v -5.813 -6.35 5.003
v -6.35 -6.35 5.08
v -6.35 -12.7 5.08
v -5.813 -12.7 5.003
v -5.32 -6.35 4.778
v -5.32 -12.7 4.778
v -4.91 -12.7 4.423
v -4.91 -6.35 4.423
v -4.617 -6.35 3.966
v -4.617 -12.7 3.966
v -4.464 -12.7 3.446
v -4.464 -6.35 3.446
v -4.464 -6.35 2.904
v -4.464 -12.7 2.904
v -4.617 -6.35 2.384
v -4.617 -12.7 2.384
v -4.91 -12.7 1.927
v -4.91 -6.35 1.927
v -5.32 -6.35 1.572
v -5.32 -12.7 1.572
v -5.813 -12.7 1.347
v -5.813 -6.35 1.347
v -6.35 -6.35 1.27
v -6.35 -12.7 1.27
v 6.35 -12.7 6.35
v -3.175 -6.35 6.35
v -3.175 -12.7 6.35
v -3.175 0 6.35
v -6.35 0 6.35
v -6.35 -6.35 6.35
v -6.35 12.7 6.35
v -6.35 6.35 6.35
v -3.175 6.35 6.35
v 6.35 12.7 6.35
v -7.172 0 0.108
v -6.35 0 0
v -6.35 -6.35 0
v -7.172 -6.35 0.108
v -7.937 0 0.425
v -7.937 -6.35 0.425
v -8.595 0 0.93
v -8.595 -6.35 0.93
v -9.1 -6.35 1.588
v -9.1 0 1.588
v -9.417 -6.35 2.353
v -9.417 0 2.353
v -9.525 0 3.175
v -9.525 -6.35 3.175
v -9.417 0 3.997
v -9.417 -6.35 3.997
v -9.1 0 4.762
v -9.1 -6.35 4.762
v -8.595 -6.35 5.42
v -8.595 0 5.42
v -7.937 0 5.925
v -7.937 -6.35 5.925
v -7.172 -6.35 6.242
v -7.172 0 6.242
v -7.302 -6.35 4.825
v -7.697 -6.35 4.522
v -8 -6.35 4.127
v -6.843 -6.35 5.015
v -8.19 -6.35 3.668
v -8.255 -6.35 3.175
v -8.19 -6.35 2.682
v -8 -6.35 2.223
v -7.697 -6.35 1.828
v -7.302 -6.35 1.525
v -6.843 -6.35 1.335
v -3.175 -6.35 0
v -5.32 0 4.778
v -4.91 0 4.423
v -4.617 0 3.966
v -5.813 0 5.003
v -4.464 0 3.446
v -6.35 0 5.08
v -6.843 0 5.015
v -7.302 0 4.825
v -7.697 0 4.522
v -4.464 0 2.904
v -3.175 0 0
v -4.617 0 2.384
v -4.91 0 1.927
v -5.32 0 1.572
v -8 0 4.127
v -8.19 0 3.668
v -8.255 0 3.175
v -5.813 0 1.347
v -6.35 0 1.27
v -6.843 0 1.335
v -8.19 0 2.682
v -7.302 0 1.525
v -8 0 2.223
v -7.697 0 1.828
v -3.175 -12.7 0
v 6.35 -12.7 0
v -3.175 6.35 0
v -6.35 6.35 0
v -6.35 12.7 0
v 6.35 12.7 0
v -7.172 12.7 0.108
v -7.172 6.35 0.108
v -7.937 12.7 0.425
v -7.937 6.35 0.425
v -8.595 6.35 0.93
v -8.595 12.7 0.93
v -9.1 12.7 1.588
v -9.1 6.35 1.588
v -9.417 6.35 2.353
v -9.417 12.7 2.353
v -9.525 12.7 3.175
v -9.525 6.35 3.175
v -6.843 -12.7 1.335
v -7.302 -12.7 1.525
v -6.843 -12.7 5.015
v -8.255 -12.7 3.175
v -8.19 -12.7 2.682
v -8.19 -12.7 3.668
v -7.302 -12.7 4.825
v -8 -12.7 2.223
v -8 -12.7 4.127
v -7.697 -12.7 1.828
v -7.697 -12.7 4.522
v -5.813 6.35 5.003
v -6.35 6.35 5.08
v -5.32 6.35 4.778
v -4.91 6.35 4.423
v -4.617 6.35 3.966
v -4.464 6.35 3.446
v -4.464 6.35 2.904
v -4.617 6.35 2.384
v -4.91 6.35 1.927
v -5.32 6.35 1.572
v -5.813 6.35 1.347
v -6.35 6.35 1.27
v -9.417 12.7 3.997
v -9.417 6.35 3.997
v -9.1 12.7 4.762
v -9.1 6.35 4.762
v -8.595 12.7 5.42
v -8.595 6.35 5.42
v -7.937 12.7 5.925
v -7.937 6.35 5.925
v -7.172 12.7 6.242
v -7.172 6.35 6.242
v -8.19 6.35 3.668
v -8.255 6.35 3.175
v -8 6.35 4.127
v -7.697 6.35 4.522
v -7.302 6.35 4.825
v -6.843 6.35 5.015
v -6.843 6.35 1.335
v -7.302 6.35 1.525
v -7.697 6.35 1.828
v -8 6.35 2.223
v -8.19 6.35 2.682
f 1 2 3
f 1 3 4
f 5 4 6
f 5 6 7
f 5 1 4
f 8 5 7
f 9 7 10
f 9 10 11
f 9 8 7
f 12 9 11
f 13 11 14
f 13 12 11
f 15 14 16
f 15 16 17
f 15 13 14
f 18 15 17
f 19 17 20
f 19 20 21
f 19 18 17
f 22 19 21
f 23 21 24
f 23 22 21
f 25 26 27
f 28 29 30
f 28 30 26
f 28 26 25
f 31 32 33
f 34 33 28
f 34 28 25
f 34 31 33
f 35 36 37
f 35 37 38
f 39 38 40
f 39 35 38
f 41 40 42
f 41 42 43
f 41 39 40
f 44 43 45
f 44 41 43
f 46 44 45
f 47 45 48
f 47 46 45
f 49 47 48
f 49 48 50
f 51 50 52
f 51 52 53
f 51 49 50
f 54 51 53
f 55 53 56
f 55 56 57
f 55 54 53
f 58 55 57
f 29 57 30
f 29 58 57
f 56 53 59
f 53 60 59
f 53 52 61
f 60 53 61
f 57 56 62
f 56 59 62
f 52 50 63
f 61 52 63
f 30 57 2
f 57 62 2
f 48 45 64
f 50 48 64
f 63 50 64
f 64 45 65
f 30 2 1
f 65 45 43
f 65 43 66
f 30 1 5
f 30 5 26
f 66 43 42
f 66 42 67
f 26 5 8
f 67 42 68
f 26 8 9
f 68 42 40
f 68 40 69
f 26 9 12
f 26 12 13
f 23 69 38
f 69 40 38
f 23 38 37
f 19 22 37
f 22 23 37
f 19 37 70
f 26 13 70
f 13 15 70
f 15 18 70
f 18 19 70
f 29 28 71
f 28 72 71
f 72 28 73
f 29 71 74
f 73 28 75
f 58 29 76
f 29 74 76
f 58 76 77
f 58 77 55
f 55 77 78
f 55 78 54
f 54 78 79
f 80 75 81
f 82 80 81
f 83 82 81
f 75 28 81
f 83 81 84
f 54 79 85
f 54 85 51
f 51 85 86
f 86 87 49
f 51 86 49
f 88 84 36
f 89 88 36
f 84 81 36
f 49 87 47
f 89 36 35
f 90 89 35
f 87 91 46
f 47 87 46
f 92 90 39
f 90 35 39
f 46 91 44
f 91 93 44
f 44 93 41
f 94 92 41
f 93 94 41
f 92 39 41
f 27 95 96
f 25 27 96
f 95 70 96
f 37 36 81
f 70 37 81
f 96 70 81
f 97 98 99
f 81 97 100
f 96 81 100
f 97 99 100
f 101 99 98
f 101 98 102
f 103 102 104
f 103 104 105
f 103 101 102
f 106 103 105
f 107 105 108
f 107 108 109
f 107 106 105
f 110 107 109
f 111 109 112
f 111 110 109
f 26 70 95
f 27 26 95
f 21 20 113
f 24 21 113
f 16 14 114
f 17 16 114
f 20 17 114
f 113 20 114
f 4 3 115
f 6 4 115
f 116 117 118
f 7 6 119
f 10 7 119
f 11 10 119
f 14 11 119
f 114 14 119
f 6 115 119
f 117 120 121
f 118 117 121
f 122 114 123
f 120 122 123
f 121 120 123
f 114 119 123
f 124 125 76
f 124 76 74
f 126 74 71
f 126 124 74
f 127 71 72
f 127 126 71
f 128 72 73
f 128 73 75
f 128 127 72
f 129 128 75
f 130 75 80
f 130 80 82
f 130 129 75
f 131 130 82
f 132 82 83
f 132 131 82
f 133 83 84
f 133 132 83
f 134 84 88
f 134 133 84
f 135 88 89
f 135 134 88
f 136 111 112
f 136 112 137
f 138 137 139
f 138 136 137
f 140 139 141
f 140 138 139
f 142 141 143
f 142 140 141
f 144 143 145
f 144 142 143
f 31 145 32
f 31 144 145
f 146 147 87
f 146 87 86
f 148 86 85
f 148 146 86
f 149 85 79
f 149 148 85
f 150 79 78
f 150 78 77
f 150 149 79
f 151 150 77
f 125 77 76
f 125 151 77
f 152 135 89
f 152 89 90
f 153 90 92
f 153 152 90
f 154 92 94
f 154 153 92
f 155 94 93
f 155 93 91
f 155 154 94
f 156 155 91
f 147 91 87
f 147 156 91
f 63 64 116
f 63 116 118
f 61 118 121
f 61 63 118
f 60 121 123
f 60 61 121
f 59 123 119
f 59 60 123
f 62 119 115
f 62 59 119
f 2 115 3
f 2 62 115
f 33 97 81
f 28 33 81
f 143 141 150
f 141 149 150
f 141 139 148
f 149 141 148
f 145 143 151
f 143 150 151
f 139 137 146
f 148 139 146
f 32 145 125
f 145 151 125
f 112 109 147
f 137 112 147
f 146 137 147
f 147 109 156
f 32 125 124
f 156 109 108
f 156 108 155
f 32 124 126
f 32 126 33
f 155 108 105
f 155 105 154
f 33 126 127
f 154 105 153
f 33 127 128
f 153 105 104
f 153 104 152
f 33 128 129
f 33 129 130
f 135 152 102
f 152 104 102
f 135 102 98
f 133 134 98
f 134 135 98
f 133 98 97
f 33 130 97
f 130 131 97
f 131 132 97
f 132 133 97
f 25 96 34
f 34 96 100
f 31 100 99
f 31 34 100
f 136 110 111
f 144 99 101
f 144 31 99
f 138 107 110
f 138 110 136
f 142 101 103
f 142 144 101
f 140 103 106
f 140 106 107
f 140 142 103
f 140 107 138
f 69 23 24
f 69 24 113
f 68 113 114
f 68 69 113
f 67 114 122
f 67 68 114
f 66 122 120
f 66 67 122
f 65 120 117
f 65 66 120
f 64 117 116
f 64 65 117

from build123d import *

# Parameters (mm, degrees)
F0_W     = 12.7
F0_H     = 25.4
F1_DEPTH = 6.35
F3_DEPTH = 25.4
F4_DEPTH = 25.4
F5_W     = 3.1755
F5_H     = 6.35
F5_W_2   = 3.1745
F6_DEPTH = 25.4
F7_DEPTH = 25.4


with BuildPart() as f1:
    # F0 (on Top) → F1 (new body)
    with BuildSketch(Plane.XY):
        Rectangle(F0_W, F0_H)
    extrude(amount=F1_DEPTH)

    # F2 (on face) → F3 (join)
    with BuildSketch(Plane(origin=(0, 12.7, 0), x_dir=(-1, 0, 0), z_dir=(0, 1, 0))):
        with BuildLine():
            Line((6.35, 5.08), (6.35, 6.35))
            ThreePointArc((6.35, 6.35), (3.175, 3.175), (6.35, 0))
            Line((6.35, 0), (6.35, 1.27))
            ThreePointArc((6.35, 1.27), (4.445, 3.175), (6.35, 5.08))
        make_face()
        with BuildLine():
            ThreePointArc((-6.35, 0), (-4.104936, 0.929936), (-3.175, 3.175))
            ThreePointArc((-3.175, 3.175), (-4.104936, 5.420064), (-6.35, 6.35))
            Line((-6.35, 6.35), (-6.35, 5.08))
            ThreePointArc((-6.35, 5.08), (-5.002962, 4.522038), (-4.445, 3.175))
            ThreePointArc((-4.445, 3.175), (-5.002962, 1.827962), (-6.35, 1.27))
            Line((-6.35, 1.27), (-6.35, 0))
        make_face()
        with BuildLine():
            ThreePointArc((9.525, 3.175), (8.595064, 5.420064), (6.35, 6.35))
            Line((6.35, 6.35), (6.35, 5.08))
            ThreePointArc((6.35, 5.08), (7.697038, 4.522038), (8.255, 3.175))
            ThreePointArc((8.255, 3.175), (7.697038, 1.827962), (6.35, 1.27))
            Line((6.35, 1.27), (6.35, 0))
            ThreePointArc((6.35, 0), (8.595064, 0.929936), (9.525, 3.175))
        make_face()
        with BuildLine():
            ThreePointArc((-4.445, 3.175), (-5.002962, 4.522038), (-6.35, 5.08))
            Line((-6.35, 5.08), (-6.35, 1.27))
            ThreePointArc((-6.35, 1.27), (-5.002962, 1.827962), (-4.445, 3.175))
        make_face()
    extrude(amount=-F3_DEPTH)

    # F2 (on face) → F4 (cut)
    with BuildSketch(Plane(origin=(0, 12.7, 0), x_dir=(-1, 0, 0), z_dir=(0, 1, 0))):
        with BuildLine():
            Line((-6.35, 1.27), (-6.35, 5.08))
            ThreePointArc((-6.35, 5.08), (-8.255, 3.175), (-6.35, 1.27))
        make_face()
        with BuildLine():
            ThreePointArc((8.255, 3.175), (7.697038, 4.522038), (6.35, 5.08))
            Line((6.35, 5.08), (6.35, 1.27))
            ThreePointArc((6.35, 1.27), (7.697038, 1.827962), (8.255, 3.175))
        make_face()
    extrude(amount=-F4_DEPTH, mode=Mode.SUBTRACT)

    # F5 (on face) → F6 (cut)
    with BuildSketch(Plane(origin=(0, 0, 0), x_dir=(1, 0, 0), z_dir=(0, 0, -1))):
        with Locations((-7.93775, 9.525)):
            Rectangle(F5_W, F5_H)
        with Locations((-7.93775, -3.175)):
            Rectangle(F5_W, F5_H)
        with Locations((-4.76275, 9.525)):
            Rectangle(F5_W_2, F5_H)
        with Locations((-4.76275, -3.175)):
            Rectangle(F5_W_2, F5_H)
    extrude(amount=-F6_DEPTH, mode=Mode.SUBTRACT)

    # F2 (on face) → F7 (join)
    with BuildSketch(Plane(origin=(0, 12.7, 0), x_dir=(-1, 0, 0), z_dir=(0, 1, 0))):
        with BuildLine():
            ThreePointArc((8.255, 3.175), (7.697038, 4.522038), (6.35, 5.08))
            Line((6.35, 5.08), (6.35, 1.27))
            ThreePointArc((6.35, 1.27), (7.697038, 1.827962), (8.255, 3.175))
        make_face()
        with BuildLine():
            Line((6.35, 1.27), (6.35, 5.08))
            ThreePointArc((6.35, 5.08), (4.445, 3.175), (6.35, 1.27))
        make_face()
    extrude(amount=-F7_DEPTH)


solid = f1.part
